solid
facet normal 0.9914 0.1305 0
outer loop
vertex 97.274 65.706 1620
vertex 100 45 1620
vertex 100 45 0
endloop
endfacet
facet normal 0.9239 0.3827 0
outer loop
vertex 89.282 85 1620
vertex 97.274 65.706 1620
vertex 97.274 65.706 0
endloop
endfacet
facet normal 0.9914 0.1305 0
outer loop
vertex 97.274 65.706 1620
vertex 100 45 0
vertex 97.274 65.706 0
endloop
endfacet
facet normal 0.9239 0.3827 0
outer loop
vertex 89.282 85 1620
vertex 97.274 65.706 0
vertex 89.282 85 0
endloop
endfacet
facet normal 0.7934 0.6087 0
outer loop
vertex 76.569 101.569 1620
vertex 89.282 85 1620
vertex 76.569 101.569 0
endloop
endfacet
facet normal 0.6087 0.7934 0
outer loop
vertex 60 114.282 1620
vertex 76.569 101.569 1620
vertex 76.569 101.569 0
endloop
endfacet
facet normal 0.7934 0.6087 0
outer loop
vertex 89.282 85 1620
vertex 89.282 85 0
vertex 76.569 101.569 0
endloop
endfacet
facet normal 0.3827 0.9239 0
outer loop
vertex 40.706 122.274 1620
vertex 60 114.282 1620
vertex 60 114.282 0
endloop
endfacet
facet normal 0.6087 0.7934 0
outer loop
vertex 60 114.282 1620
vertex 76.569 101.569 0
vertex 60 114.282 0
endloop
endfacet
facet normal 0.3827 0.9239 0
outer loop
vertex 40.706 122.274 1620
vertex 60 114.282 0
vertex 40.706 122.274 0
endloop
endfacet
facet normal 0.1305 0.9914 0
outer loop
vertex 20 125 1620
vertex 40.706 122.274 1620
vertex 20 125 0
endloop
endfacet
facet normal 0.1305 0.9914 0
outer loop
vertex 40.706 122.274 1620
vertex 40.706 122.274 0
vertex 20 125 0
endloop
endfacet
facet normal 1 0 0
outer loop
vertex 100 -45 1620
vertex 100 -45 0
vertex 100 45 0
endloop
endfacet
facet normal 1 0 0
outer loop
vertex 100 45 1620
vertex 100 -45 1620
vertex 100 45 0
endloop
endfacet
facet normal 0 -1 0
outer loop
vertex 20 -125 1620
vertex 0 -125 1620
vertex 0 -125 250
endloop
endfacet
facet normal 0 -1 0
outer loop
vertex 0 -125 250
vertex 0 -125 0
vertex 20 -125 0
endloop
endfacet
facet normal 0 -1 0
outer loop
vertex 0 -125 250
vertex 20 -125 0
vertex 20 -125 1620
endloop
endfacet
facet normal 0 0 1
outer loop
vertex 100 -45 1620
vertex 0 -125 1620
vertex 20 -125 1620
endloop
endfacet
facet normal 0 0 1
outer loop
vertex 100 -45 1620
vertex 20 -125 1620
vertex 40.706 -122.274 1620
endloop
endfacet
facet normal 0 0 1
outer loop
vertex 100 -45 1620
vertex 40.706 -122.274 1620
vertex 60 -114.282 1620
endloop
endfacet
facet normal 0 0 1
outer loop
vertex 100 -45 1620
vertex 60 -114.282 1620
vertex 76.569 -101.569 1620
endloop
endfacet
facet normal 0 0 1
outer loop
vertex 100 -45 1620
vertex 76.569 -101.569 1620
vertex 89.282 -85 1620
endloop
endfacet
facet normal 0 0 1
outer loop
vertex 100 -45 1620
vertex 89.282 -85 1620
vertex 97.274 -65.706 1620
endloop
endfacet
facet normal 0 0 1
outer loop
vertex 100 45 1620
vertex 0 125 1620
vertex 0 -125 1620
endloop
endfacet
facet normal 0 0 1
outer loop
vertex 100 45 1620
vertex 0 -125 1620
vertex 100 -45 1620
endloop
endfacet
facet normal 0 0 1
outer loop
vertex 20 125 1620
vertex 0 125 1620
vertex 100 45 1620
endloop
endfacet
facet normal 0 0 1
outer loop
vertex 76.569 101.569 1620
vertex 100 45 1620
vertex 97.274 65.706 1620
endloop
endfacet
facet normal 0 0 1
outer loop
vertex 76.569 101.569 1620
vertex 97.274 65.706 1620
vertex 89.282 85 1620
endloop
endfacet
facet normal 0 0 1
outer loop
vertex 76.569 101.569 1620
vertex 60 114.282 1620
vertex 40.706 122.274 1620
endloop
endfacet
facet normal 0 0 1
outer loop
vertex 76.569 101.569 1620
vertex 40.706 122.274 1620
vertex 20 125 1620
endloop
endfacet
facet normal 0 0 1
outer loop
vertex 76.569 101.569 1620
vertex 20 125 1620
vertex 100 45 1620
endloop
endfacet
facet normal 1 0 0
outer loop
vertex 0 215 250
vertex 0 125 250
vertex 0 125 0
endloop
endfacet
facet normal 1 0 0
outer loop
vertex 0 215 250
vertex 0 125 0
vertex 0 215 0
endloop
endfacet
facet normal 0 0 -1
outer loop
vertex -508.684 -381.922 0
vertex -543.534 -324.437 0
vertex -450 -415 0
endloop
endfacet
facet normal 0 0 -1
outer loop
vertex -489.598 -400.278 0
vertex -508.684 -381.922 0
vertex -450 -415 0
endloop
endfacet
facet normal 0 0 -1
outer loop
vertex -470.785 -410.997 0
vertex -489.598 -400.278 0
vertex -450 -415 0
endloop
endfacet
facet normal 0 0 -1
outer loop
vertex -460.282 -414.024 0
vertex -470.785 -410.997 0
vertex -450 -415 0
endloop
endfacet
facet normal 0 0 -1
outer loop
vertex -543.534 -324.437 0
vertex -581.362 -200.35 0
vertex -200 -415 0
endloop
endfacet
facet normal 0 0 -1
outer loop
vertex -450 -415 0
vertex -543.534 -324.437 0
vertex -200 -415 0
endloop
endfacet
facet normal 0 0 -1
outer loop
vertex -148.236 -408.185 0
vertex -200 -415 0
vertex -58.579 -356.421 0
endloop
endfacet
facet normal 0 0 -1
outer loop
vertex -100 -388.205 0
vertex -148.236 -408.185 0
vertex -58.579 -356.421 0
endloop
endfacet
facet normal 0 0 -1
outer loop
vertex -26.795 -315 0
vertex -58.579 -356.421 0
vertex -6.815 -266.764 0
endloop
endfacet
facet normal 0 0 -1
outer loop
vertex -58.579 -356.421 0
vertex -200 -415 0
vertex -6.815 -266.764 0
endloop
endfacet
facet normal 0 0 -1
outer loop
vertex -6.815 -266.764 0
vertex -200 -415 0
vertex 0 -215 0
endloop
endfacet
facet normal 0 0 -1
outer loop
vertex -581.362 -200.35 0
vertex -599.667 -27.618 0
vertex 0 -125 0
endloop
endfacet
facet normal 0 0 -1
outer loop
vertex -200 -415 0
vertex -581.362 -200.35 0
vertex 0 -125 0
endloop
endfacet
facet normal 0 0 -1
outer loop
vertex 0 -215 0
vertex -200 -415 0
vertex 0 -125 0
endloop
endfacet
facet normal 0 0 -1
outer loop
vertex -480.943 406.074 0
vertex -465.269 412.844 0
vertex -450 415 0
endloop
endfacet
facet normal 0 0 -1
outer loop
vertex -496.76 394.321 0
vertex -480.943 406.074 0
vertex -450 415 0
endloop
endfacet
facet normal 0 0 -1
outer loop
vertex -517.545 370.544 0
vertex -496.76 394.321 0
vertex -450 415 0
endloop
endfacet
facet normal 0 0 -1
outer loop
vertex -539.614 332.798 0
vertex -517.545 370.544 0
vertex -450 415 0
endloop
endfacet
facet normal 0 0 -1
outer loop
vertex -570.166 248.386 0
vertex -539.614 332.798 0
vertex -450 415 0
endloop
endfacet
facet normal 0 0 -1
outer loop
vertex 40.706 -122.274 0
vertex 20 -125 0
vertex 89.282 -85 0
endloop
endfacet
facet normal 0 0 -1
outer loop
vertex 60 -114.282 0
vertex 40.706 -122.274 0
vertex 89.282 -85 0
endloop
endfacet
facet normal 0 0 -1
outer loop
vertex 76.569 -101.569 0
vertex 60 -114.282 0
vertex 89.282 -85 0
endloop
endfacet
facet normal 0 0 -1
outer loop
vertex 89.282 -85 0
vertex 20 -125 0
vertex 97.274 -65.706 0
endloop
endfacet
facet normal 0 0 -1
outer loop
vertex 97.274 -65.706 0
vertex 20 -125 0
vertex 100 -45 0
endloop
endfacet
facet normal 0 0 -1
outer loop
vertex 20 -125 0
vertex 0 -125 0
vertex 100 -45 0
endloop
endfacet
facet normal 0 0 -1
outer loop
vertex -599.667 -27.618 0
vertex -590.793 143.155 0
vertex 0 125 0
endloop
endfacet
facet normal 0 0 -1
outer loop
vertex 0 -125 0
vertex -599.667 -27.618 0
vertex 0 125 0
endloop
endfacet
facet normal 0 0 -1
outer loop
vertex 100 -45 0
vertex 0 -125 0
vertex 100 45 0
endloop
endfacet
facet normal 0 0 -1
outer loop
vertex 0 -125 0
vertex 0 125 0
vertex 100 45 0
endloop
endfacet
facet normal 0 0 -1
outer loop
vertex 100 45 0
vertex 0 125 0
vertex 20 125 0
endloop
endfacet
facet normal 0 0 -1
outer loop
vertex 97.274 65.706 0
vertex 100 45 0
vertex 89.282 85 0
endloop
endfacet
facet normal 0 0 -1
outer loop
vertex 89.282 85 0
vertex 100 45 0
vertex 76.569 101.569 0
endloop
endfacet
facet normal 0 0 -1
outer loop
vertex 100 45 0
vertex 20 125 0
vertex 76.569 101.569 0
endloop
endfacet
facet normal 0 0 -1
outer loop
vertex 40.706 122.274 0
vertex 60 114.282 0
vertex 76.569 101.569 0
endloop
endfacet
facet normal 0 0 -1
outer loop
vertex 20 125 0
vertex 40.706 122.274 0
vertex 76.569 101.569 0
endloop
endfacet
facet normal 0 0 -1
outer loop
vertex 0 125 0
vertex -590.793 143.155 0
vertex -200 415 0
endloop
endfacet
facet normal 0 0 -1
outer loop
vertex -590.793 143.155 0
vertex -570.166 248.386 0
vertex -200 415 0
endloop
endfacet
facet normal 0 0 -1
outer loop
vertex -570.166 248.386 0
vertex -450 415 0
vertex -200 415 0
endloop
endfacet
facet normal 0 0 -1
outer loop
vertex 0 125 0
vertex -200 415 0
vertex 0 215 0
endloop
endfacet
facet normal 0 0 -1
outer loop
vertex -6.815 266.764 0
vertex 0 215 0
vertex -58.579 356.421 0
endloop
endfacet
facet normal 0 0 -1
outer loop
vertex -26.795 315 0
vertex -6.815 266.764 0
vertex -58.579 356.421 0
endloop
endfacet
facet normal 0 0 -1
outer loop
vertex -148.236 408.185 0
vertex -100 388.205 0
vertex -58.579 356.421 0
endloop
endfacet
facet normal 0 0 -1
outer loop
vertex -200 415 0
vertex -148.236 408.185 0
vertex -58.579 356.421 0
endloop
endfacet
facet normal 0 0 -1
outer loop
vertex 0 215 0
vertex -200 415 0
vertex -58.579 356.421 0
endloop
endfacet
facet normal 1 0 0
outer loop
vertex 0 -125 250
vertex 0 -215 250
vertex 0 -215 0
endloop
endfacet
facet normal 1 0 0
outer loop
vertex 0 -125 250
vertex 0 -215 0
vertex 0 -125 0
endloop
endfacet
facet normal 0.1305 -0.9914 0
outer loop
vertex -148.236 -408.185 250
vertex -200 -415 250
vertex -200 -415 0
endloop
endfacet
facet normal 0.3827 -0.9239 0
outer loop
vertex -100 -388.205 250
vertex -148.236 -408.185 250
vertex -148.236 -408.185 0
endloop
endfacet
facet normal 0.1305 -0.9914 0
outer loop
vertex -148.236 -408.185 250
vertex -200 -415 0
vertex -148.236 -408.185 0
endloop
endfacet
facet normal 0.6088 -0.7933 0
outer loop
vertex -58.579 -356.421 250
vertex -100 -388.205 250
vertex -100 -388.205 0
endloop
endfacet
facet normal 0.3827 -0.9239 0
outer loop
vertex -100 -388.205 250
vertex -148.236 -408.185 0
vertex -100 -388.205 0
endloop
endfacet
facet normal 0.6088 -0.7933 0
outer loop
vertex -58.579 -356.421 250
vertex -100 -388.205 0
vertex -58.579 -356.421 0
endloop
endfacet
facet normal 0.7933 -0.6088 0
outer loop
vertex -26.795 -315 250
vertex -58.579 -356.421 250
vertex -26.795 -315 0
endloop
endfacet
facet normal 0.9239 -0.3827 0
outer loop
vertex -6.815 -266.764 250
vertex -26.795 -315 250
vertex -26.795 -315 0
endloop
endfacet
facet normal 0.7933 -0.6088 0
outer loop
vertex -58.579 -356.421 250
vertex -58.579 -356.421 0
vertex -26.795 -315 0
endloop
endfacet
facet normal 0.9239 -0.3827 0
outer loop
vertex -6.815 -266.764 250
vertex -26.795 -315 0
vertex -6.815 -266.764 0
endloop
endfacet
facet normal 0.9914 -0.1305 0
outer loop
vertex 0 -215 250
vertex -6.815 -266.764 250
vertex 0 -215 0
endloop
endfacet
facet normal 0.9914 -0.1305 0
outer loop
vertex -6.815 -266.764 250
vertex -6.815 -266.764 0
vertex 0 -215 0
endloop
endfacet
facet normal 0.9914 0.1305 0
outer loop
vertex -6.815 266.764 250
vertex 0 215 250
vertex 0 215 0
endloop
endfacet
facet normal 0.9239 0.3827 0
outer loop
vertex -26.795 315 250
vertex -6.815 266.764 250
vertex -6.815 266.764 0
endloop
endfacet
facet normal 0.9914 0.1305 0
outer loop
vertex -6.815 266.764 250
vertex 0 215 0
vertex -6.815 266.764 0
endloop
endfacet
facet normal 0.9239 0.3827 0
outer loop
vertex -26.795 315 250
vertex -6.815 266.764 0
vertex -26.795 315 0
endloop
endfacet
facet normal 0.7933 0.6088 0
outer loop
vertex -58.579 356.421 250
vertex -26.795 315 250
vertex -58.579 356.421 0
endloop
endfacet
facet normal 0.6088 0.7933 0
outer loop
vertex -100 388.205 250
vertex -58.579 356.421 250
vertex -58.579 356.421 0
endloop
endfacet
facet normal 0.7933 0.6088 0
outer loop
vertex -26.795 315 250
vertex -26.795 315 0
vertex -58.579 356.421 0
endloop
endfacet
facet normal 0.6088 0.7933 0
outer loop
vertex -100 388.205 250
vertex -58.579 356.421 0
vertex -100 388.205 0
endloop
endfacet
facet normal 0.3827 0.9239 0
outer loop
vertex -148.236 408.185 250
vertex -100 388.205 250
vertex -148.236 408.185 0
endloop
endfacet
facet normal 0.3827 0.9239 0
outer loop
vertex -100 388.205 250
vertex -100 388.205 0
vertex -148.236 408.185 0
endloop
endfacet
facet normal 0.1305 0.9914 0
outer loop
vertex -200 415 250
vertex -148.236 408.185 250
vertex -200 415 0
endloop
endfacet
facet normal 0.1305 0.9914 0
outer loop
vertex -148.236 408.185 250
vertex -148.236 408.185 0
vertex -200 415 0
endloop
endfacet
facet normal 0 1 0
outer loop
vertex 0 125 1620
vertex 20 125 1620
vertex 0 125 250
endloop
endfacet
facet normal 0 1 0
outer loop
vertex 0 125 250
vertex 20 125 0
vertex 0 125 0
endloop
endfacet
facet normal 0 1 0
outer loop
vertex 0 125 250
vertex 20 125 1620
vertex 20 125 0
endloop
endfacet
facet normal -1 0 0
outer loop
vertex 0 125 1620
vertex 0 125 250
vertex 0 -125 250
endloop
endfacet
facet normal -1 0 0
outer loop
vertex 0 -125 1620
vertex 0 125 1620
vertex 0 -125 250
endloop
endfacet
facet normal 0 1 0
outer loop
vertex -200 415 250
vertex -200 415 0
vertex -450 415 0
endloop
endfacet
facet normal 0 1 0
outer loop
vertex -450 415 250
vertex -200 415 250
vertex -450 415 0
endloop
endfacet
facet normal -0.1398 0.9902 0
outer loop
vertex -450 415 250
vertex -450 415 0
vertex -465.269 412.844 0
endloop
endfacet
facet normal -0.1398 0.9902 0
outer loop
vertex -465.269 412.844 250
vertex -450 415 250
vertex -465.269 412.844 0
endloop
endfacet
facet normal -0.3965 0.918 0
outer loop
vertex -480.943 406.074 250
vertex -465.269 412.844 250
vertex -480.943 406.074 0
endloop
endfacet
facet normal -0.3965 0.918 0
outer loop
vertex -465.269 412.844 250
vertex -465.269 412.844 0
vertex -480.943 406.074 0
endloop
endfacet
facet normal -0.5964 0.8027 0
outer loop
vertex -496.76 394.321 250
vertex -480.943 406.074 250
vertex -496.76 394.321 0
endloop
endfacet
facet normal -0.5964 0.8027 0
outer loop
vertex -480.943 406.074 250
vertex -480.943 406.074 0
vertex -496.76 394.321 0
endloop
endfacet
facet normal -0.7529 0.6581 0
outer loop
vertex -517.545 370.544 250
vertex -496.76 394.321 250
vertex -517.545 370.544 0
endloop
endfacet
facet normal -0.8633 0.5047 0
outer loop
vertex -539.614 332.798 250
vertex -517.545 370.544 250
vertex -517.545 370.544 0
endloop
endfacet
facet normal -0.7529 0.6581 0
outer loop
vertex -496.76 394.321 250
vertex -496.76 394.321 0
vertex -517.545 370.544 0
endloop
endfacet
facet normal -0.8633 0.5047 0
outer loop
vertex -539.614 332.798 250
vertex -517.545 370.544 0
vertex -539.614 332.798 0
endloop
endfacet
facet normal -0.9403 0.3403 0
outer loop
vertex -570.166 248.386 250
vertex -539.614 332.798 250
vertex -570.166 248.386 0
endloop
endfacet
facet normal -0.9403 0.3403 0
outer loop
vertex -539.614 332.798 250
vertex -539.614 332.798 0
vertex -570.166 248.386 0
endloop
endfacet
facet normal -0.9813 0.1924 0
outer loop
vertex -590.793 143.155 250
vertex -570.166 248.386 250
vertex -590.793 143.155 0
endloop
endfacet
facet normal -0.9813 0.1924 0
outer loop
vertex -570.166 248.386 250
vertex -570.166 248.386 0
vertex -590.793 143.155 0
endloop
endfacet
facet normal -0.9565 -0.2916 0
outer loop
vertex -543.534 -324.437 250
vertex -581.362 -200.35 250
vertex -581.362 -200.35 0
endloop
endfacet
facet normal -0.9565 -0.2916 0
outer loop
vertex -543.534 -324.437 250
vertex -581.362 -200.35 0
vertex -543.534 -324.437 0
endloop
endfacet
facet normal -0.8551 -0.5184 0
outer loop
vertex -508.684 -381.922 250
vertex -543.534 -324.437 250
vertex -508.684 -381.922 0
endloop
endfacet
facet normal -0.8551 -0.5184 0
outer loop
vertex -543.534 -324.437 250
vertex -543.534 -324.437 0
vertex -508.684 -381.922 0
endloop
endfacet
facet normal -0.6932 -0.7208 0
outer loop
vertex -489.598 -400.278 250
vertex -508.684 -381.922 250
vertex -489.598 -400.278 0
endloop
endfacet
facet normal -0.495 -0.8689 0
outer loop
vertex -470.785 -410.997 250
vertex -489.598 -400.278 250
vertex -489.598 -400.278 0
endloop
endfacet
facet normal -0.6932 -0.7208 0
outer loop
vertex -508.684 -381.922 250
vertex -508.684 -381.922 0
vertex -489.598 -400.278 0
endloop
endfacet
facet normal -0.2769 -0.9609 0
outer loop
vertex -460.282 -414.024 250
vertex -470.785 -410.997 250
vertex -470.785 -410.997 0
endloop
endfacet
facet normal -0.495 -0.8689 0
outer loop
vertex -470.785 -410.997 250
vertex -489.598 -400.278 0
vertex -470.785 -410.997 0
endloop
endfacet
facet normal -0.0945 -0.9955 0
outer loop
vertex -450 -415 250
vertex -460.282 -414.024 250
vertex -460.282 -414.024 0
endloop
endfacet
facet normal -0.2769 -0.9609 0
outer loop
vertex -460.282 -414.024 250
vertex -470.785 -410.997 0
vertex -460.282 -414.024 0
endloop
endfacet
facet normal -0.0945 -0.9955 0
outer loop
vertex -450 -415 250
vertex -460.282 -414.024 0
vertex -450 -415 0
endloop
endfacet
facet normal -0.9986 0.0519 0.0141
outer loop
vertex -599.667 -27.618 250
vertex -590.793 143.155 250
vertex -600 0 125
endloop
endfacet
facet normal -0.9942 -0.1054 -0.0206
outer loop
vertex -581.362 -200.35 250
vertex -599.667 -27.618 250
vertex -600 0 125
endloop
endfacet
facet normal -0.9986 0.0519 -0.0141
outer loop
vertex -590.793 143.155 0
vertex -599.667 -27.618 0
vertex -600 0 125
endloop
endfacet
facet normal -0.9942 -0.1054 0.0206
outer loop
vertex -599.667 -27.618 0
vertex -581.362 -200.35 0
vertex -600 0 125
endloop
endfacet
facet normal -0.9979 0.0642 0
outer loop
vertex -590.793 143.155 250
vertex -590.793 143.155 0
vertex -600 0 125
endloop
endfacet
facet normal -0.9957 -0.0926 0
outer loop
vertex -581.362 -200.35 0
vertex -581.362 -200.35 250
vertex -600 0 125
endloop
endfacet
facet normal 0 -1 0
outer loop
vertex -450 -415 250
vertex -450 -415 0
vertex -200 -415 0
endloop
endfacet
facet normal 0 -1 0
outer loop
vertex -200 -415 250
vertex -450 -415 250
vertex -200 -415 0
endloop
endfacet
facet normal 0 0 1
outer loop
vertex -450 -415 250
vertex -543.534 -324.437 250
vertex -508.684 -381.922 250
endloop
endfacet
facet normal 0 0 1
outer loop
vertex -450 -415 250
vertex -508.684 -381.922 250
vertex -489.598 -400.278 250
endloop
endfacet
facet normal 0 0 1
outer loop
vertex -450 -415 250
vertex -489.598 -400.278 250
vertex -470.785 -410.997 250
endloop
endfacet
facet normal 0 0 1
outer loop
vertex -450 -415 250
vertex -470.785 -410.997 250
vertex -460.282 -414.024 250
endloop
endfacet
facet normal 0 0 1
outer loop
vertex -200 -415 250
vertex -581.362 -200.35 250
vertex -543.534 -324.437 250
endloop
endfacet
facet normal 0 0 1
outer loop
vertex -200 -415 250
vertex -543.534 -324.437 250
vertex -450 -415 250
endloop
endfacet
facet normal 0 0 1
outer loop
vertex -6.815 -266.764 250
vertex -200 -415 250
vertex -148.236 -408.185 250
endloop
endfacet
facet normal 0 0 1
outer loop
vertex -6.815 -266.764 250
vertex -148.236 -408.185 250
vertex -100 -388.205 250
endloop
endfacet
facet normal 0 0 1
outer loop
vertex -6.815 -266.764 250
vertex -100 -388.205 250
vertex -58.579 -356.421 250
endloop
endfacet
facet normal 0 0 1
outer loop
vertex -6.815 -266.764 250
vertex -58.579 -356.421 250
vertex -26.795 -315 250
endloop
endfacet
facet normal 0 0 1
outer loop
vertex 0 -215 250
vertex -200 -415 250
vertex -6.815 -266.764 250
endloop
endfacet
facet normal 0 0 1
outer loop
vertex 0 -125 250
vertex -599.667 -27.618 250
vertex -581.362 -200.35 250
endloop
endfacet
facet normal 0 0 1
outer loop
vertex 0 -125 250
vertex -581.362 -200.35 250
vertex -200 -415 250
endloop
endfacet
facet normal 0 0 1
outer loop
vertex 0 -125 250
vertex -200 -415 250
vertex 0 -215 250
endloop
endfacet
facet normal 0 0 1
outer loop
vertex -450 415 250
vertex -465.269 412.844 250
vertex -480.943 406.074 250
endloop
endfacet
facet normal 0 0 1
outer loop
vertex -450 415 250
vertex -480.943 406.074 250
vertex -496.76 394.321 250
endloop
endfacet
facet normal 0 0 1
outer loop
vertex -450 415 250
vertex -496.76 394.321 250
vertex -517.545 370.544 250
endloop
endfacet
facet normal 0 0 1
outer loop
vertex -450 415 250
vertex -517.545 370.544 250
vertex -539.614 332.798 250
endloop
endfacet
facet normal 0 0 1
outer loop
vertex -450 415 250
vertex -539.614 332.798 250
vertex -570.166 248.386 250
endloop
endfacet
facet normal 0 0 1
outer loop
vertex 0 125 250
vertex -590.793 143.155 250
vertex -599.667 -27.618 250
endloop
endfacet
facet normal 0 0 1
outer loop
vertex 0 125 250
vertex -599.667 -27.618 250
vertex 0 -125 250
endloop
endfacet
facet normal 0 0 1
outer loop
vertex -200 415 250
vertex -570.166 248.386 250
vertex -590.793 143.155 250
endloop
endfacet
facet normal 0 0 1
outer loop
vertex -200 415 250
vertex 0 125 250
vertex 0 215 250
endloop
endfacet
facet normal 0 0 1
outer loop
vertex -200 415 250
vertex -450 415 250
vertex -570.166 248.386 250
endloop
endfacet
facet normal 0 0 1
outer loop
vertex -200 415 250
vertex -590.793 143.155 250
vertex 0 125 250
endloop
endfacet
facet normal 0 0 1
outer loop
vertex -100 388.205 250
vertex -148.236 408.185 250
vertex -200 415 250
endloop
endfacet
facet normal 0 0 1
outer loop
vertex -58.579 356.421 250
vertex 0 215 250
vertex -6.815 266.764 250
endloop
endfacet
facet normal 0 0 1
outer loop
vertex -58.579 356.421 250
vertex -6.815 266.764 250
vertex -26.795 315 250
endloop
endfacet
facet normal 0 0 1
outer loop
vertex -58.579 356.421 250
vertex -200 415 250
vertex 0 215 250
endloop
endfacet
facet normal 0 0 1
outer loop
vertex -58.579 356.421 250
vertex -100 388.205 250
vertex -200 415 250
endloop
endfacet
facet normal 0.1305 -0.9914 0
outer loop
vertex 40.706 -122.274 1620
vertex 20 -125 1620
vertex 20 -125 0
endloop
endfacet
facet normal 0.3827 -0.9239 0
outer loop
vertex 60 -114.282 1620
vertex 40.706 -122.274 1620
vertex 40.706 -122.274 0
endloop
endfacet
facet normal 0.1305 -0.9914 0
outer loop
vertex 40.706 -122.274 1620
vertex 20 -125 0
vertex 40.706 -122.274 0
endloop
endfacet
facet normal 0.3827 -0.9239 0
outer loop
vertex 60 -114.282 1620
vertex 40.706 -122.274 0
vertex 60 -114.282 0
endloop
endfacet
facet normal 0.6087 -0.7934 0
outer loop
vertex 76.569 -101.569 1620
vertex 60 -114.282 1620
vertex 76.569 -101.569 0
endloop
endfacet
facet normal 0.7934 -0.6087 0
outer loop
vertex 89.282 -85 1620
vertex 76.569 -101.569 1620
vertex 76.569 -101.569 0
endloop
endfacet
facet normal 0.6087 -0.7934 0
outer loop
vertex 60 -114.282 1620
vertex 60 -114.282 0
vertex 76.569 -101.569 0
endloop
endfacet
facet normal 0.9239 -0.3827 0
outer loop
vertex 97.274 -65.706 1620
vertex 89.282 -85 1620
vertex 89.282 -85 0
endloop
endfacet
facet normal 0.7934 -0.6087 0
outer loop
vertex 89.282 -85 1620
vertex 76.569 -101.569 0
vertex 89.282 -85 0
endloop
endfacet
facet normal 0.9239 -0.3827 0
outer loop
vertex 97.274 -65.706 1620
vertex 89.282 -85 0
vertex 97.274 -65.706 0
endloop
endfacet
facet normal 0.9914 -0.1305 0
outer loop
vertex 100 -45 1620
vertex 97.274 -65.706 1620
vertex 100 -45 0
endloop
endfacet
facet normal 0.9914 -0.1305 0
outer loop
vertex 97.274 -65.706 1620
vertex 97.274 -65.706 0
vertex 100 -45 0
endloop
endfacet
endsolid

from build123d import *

# Parameters (mm, degrees)
F1_DEPTH = 250
F3_DEPTH = 1620


with BuildPart() as f1:
    # F0 (on Top) → F1 (new body)
    with BuildSketch(Plane.XY):
        with BuildLine():
            Line((-200, 415), (-450, 415))
            add(Edge.make_bspline(
                [(-450, 415), (-600, 415), (-600, 0), (-600, -415), (-450, -415)],
                knots=[0, 0, 0, 1.5707963268, 1.5707963268, 3.1415926536, 3.1415926536, 3.1415926536], degree=2, weights=[1, 0.7071067812, 1, 0.7071067812, 1]))
            Line((-450, -415), (-200, -415))
            ThreePointArc((-200, -415), (-58.5786437627, -356.4213562373), (0, -215))
            Line((0, -215), (0, 215))
            ThreePointArc((0, 215), (-58.5786437627, 356.4213562373), (-200, 415))
        make_face()
    extrude(amount=F1_DEPTH)

    # F2 (on Top) → F3 (join)
    with BuildSketch(Plane.XY):
        with BuildLine():
            Line((20, 125), (0, 125))
            Line((0, 125), (0, -125))
            Line((0, -125), (20, -125))
            ThreePointArc((20, -125), (76.5685424949, -101.5685424949), (100, -45))
            Line((100, -45), (100, 45))
            ThreePointArc((100, 45), (76.5685424949, 101.5685424949), (20, 125))
        make_face()
    extrude(amount=F3_DEPTH)


solid = f1.part
